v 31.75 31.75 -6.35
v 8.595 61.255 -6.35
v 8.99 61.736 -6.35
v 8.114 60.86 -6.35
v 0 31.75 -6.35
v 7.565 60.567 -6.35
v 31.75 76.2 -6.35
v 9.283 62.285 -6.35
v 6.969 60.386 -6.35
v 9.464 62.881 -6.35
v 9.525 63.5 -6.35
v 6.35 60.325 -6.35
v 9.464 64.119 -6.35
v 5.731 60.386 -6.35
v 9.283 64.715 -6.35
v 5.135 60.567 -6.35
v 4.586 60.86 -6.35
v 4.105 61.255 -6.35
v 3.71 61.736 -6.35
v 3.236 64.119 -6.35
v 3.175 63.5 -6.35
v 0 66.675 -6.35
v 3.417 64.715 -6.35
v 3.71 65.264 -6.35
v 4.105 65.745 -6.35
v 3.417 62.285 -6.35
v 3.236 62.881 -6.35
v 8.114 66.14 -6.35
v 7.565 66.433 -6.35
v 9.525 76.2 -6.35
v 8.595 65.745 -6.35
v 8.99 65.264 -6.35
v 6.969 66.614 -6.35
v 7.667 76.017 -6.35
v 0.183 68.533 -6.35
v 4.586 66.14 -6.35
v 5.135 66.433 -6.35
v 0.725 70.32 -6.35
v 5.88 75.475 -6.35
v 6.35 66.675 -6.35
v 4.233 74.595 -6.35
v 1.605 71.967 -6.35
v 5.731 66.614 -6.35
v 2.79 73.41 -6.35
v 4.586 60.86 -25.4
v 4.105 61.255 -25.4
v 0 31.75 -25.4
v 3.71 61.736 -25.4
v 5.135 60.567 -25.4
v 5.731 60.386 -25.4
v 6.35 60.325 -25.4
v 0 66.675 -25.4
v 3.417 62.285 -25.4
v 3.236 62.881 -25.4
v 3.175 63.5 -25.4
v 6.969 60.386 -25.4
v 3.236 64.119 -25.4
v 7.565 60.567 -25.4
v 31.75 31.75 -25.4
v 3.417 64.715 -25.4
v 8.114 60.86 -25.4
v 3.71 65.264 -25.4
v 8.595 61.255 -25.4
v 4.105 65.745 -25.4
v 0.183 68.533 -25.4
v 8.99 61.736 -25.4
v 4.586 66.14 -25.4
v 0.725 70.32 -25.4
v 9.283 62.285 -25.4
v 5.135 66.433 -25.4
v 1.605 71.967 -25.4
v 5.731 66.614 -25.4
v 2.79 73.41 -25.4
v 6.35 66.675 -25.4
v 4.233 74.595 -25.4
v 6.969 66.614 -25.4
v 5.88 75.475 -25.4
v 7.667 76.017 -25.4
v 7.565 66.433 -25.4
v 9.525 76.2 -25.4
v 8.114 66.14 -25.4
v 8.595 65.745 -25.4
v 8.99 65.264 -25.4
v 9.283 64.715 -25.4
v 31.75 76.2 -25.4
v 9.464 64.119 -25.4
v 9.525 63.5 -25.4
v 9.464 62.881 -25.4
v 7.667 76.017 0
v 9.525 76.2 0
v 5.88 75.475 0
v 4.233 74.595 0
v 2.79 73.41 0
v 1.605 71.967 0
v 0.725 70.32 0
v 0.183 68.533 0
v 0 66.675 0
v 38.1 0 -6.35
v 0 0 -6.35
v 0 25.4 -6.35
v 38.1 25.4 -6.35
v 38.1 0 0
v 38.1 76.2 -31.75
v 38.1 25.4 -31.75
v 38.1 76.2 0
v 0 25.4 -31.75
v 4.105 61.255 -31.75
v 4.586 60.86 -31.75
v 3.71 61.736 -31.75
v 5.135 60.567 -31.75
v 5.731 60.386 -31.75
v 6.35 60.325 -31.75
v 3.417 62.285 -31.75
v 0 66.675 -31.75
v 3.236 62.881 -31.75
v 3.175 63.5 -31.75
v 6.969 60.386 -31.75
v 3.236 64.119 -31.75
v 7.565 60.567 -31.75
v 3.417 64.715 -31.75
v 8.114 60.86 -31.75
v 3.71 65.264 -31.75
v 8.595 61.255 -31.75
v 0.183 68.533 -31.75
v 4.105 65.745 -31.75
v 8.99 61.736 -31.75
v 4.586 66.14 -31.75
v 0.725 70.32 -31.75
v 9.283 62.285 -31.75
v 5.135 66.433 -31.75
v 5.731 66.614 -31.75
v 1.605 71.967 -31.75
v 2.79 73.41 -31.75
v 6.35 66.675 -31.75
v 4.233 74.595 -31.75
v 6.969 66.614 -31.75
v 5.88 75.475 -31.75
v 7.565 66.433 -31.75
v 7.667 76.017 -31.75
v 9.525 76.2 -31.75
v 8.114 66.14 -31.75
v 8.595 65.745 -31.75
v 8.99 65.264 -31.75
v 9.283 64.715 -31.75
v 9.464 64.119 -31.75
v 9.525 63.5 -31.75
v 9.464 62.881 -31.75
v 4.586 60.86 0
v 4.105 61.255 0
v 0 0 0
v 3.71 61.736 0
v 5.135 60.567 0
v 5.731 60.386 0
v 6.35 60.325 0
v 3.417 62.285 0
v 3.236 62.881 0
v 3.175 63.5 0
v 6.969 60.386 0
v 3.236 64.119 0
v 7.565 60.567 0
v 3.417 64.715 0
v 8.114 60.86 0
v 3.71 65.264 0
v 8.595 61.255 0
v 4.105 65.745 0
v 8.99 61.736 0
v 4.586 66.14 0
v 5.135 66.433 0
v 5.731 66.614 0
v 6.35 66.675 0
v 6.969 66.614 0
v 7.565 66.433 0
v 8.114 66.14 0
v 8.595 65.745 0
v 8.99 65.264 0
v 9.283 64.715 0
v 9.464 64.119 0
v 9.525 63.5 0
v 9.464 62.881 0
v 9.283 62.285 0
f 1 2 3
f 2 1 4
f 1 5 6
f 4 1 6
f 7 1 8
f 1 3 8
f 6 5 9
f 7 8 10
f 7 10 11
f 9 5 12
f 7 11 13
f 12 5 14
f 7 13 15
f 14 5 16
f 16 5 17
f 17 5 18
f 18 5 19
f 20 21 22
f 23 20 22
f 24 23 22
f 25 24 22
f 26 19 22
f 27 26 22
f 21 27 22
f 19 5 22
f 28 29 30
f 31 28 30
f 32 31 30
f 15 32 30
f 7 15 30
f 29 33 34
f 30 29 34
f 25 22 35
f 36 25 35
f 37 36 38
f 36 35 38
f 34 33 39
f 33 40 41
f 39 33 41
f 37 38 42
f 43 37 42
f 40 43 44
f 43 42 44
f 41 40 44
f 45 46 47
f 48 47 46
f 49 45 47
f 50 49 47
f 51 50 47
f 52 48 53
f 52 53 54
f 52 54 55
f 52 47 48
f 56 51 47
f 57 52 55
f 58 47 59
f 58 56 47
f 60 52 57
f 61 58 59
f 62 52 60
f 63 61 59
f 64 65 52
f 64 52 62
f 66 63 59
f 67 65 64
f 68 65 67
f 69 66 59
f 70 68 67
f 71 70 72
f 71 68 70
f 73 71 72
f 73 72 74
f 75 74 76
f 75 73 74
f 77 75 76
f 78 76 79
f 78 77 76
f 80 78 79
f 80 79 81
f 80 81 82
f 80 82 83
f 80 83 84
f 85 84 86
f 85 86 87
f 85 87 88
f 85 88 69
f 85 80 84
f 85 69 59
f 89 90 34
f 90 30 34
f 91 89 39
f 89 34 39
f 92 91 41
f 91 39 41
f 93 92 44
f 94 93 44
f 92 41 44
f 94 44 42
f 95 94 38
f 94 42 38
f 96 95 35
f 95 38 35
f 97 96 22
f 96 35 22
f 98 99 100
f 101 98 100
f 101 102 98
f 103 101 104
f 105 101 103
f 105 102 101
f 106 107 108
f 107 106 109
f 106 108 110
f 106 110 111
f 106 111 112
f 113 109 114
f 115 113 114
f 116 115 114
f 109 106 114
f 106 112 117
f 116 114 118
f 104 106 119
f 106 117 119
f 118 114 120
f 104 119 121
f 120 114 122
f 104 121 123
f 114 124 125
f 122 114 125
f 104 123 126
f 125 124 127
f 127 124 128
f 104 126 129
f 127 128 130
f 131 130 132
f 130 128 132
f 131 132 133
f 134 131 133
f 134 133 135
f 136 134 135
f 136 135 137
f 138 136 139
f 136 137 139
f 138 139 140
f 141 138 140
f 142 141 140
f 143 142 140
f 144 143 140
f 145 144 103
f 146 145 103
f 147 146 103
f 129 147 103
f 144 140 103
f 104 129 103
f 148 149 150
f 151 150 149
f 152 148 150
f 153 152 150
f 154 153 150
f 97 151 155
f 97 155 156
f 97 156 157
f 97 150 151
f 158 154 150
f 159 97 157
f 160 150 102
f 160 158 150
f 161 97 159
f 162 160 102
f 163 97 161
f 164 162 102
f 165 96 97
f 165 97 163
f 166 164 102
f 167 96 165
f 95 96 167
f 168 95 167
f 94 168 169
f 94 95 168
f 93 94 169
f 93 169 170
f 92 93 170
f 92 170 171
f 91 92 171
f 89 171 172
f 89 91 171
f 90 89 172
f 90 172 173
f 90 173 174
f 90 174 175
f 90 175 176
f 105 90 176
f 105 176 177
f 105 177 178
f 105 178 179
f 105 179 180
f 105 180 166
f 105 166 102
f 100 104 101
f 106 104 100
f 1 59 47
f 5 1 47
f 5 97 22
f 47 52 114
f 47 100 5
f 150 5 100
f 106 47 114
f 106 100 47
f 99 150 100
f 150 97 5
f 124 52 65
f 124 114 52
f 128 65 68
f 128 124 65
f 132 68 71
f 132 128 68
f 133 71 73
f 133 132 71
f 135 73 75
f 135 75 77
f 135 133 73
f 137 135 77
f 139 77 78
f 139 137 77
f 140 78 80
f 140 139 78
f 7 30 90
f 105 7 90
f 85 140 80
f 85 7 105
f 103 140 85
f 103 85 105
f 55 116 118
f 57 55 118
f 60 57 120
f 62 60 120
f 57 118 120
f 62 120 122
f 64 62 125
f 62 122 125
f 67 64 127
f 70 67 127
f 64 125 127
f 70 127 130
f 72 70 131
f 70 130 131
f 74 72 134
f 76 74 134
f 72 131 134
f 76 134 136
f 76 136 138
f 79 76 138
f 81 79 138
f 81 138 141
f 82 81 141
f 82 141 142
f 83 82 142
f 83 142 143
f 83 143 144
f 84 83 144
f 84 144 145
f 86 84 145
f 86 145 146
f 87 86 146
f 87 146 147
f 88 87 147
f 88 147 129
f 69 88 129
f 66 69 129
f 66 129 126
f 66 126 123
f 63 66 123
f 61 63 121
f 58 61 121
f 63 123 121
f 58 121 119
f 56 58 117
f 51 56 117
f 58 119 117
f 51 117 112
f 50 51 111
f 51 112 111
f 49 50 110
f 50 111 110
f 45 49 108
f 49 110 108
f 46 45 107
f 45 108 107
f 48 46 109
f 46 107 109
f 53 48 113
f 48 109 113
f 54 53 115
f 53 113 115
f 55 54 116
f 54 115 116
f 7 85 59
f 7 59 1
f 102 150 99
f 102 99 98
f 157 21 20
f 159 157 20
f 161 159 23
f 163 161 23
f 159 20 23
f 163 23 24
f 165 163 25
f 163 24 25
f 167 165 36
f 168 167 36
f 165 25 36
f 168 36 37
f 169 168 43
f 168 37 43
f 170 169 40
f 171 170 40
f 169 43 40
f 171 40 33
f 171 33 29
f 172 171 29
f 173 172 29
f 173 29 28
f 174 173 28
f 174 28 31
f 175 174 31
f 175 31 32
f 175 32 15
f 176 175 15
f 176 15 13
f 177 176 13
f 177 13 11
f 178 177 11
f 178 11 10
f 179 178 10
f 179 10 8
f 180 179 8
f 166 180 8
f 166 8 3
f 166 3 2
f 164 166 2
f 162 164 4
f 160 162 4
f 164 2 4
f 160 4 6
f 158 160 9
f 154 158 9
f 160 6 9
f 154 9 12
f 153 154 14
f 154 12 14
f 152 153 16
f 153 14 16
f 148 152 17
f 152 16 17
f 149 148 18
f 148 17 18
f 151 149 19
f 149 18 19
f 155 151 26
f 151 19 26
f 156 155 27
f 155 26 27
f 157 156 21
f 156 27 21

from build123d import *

# Parameters (mm, degrees)
SKETCH1_W           = 38.1
SKETCH1_H           = 76.2
BOSS_EXTRUDE1_DEPTH = 31.75
SKETCH3_W           = 25.4
SKETCH3_H           = 76.2
CUT_EXTRUDE2_DEPTH  = 31.75
SKETCH4_W           = 25.4
SKETCH4_H           = 25.4
CUT_EXTRUDE3_DEPTH  = 89.44526556
SKETCH5_W           = 31.75
SKETCH5_H           = 6.35
BOSS_EXTRUDE2_DEPTH = 50.8
SKETCH6_R           = 3.175
CUT_EXTRUDE4_DEPTH  = 50.8
FILLET2_R           = 9.525
SKETCH7_W           = 31.75
SKETCH7_H           = 19.05
BOSS_EXTRUDE3_DEPTH = 6.35


with BuildPart() as part:
    # Sketch1 → Boss-Extrude1 (new body)
    with BuildSketch(Plane.XY):
        with Locations((19.05, 38.1)):
            Rectangle(SKETCH1_W, SKETCH1_H)
    extrude(amount=-BOSS_EXTRUDE1_DEPTH)

    # Sketch3 → Cut-Extrude2 (cut)
    with BuildSketch(Plane.ZY):
        with Locations((-19.05, 38.1)):
            Rectangle(SKETCH3_W, SKETCH3_H)
    extrude(amount=-CUT_EXTRUDE2_DEPTH, mode=Mode.SUBTRACT)

    # Sketch4 → Cut-Extrude3 (cut, through all)
    with BuildSketch(Plane.ZY.offset(-31.75)):
        with Locations((-19.05, 12.7)):
            Rectangle(SKETCH4_W, SKETCH4_H)
    extrude(amount=-CUT_EXTRUDE3_DEPTH, mode=Mode.SUBTRACT)

    # Sketch5 → Boss-Extrude2 (add)
    with BuildSketch(Plane(origin=(0, 76.2, 0), x_dir=(1, 0, 0), z_dir=(0, 1, 0))):
        with Locations((15.875, 28.575)):
            Rectangle(SKETCH5_W, SKETCH5_H)
    extrude(amount=-BOSS_EXTRUDE2_DEPTH)

    # Sketch6 → Cut-Extrude4 (cut)
    with BuildSketch(Plane(origin=(0, 0, -31.75), x_dir=(-1, 0, 0), z_dir=(0, 0, -1))):
        with Locations((-6.35, 63.5)):
            Circle(SKETCH6_R)
    extrude(amount=-CUT_EXTRUDE4_DEPTH, mode=Mode.SUBTRACT)

    # Fillet2
    fillet2_edges = [part.edges().sort_by_distance(p)[0] for p in [
        (0, 76.2, -3.175),
        (0, 76.2, -28.575),
    ]]
    fillet(fillet2_edges, radius=FILLET2_R)

    # Sketch7 → Boss-Extrude3 (add)
    with BuildSketch(Plane(origin=(0, 25.4, 0), x_dir=(-1, 0, 0), z_dir=(0, -1, 0))):
        with Locations((-15.875, 15.875)):
            Rectangle(SKETCH7_W, SKETCH7_H)
    extrude(amount=-BOSS_EXTRUDE3_DEPTH)


solid = part.part
